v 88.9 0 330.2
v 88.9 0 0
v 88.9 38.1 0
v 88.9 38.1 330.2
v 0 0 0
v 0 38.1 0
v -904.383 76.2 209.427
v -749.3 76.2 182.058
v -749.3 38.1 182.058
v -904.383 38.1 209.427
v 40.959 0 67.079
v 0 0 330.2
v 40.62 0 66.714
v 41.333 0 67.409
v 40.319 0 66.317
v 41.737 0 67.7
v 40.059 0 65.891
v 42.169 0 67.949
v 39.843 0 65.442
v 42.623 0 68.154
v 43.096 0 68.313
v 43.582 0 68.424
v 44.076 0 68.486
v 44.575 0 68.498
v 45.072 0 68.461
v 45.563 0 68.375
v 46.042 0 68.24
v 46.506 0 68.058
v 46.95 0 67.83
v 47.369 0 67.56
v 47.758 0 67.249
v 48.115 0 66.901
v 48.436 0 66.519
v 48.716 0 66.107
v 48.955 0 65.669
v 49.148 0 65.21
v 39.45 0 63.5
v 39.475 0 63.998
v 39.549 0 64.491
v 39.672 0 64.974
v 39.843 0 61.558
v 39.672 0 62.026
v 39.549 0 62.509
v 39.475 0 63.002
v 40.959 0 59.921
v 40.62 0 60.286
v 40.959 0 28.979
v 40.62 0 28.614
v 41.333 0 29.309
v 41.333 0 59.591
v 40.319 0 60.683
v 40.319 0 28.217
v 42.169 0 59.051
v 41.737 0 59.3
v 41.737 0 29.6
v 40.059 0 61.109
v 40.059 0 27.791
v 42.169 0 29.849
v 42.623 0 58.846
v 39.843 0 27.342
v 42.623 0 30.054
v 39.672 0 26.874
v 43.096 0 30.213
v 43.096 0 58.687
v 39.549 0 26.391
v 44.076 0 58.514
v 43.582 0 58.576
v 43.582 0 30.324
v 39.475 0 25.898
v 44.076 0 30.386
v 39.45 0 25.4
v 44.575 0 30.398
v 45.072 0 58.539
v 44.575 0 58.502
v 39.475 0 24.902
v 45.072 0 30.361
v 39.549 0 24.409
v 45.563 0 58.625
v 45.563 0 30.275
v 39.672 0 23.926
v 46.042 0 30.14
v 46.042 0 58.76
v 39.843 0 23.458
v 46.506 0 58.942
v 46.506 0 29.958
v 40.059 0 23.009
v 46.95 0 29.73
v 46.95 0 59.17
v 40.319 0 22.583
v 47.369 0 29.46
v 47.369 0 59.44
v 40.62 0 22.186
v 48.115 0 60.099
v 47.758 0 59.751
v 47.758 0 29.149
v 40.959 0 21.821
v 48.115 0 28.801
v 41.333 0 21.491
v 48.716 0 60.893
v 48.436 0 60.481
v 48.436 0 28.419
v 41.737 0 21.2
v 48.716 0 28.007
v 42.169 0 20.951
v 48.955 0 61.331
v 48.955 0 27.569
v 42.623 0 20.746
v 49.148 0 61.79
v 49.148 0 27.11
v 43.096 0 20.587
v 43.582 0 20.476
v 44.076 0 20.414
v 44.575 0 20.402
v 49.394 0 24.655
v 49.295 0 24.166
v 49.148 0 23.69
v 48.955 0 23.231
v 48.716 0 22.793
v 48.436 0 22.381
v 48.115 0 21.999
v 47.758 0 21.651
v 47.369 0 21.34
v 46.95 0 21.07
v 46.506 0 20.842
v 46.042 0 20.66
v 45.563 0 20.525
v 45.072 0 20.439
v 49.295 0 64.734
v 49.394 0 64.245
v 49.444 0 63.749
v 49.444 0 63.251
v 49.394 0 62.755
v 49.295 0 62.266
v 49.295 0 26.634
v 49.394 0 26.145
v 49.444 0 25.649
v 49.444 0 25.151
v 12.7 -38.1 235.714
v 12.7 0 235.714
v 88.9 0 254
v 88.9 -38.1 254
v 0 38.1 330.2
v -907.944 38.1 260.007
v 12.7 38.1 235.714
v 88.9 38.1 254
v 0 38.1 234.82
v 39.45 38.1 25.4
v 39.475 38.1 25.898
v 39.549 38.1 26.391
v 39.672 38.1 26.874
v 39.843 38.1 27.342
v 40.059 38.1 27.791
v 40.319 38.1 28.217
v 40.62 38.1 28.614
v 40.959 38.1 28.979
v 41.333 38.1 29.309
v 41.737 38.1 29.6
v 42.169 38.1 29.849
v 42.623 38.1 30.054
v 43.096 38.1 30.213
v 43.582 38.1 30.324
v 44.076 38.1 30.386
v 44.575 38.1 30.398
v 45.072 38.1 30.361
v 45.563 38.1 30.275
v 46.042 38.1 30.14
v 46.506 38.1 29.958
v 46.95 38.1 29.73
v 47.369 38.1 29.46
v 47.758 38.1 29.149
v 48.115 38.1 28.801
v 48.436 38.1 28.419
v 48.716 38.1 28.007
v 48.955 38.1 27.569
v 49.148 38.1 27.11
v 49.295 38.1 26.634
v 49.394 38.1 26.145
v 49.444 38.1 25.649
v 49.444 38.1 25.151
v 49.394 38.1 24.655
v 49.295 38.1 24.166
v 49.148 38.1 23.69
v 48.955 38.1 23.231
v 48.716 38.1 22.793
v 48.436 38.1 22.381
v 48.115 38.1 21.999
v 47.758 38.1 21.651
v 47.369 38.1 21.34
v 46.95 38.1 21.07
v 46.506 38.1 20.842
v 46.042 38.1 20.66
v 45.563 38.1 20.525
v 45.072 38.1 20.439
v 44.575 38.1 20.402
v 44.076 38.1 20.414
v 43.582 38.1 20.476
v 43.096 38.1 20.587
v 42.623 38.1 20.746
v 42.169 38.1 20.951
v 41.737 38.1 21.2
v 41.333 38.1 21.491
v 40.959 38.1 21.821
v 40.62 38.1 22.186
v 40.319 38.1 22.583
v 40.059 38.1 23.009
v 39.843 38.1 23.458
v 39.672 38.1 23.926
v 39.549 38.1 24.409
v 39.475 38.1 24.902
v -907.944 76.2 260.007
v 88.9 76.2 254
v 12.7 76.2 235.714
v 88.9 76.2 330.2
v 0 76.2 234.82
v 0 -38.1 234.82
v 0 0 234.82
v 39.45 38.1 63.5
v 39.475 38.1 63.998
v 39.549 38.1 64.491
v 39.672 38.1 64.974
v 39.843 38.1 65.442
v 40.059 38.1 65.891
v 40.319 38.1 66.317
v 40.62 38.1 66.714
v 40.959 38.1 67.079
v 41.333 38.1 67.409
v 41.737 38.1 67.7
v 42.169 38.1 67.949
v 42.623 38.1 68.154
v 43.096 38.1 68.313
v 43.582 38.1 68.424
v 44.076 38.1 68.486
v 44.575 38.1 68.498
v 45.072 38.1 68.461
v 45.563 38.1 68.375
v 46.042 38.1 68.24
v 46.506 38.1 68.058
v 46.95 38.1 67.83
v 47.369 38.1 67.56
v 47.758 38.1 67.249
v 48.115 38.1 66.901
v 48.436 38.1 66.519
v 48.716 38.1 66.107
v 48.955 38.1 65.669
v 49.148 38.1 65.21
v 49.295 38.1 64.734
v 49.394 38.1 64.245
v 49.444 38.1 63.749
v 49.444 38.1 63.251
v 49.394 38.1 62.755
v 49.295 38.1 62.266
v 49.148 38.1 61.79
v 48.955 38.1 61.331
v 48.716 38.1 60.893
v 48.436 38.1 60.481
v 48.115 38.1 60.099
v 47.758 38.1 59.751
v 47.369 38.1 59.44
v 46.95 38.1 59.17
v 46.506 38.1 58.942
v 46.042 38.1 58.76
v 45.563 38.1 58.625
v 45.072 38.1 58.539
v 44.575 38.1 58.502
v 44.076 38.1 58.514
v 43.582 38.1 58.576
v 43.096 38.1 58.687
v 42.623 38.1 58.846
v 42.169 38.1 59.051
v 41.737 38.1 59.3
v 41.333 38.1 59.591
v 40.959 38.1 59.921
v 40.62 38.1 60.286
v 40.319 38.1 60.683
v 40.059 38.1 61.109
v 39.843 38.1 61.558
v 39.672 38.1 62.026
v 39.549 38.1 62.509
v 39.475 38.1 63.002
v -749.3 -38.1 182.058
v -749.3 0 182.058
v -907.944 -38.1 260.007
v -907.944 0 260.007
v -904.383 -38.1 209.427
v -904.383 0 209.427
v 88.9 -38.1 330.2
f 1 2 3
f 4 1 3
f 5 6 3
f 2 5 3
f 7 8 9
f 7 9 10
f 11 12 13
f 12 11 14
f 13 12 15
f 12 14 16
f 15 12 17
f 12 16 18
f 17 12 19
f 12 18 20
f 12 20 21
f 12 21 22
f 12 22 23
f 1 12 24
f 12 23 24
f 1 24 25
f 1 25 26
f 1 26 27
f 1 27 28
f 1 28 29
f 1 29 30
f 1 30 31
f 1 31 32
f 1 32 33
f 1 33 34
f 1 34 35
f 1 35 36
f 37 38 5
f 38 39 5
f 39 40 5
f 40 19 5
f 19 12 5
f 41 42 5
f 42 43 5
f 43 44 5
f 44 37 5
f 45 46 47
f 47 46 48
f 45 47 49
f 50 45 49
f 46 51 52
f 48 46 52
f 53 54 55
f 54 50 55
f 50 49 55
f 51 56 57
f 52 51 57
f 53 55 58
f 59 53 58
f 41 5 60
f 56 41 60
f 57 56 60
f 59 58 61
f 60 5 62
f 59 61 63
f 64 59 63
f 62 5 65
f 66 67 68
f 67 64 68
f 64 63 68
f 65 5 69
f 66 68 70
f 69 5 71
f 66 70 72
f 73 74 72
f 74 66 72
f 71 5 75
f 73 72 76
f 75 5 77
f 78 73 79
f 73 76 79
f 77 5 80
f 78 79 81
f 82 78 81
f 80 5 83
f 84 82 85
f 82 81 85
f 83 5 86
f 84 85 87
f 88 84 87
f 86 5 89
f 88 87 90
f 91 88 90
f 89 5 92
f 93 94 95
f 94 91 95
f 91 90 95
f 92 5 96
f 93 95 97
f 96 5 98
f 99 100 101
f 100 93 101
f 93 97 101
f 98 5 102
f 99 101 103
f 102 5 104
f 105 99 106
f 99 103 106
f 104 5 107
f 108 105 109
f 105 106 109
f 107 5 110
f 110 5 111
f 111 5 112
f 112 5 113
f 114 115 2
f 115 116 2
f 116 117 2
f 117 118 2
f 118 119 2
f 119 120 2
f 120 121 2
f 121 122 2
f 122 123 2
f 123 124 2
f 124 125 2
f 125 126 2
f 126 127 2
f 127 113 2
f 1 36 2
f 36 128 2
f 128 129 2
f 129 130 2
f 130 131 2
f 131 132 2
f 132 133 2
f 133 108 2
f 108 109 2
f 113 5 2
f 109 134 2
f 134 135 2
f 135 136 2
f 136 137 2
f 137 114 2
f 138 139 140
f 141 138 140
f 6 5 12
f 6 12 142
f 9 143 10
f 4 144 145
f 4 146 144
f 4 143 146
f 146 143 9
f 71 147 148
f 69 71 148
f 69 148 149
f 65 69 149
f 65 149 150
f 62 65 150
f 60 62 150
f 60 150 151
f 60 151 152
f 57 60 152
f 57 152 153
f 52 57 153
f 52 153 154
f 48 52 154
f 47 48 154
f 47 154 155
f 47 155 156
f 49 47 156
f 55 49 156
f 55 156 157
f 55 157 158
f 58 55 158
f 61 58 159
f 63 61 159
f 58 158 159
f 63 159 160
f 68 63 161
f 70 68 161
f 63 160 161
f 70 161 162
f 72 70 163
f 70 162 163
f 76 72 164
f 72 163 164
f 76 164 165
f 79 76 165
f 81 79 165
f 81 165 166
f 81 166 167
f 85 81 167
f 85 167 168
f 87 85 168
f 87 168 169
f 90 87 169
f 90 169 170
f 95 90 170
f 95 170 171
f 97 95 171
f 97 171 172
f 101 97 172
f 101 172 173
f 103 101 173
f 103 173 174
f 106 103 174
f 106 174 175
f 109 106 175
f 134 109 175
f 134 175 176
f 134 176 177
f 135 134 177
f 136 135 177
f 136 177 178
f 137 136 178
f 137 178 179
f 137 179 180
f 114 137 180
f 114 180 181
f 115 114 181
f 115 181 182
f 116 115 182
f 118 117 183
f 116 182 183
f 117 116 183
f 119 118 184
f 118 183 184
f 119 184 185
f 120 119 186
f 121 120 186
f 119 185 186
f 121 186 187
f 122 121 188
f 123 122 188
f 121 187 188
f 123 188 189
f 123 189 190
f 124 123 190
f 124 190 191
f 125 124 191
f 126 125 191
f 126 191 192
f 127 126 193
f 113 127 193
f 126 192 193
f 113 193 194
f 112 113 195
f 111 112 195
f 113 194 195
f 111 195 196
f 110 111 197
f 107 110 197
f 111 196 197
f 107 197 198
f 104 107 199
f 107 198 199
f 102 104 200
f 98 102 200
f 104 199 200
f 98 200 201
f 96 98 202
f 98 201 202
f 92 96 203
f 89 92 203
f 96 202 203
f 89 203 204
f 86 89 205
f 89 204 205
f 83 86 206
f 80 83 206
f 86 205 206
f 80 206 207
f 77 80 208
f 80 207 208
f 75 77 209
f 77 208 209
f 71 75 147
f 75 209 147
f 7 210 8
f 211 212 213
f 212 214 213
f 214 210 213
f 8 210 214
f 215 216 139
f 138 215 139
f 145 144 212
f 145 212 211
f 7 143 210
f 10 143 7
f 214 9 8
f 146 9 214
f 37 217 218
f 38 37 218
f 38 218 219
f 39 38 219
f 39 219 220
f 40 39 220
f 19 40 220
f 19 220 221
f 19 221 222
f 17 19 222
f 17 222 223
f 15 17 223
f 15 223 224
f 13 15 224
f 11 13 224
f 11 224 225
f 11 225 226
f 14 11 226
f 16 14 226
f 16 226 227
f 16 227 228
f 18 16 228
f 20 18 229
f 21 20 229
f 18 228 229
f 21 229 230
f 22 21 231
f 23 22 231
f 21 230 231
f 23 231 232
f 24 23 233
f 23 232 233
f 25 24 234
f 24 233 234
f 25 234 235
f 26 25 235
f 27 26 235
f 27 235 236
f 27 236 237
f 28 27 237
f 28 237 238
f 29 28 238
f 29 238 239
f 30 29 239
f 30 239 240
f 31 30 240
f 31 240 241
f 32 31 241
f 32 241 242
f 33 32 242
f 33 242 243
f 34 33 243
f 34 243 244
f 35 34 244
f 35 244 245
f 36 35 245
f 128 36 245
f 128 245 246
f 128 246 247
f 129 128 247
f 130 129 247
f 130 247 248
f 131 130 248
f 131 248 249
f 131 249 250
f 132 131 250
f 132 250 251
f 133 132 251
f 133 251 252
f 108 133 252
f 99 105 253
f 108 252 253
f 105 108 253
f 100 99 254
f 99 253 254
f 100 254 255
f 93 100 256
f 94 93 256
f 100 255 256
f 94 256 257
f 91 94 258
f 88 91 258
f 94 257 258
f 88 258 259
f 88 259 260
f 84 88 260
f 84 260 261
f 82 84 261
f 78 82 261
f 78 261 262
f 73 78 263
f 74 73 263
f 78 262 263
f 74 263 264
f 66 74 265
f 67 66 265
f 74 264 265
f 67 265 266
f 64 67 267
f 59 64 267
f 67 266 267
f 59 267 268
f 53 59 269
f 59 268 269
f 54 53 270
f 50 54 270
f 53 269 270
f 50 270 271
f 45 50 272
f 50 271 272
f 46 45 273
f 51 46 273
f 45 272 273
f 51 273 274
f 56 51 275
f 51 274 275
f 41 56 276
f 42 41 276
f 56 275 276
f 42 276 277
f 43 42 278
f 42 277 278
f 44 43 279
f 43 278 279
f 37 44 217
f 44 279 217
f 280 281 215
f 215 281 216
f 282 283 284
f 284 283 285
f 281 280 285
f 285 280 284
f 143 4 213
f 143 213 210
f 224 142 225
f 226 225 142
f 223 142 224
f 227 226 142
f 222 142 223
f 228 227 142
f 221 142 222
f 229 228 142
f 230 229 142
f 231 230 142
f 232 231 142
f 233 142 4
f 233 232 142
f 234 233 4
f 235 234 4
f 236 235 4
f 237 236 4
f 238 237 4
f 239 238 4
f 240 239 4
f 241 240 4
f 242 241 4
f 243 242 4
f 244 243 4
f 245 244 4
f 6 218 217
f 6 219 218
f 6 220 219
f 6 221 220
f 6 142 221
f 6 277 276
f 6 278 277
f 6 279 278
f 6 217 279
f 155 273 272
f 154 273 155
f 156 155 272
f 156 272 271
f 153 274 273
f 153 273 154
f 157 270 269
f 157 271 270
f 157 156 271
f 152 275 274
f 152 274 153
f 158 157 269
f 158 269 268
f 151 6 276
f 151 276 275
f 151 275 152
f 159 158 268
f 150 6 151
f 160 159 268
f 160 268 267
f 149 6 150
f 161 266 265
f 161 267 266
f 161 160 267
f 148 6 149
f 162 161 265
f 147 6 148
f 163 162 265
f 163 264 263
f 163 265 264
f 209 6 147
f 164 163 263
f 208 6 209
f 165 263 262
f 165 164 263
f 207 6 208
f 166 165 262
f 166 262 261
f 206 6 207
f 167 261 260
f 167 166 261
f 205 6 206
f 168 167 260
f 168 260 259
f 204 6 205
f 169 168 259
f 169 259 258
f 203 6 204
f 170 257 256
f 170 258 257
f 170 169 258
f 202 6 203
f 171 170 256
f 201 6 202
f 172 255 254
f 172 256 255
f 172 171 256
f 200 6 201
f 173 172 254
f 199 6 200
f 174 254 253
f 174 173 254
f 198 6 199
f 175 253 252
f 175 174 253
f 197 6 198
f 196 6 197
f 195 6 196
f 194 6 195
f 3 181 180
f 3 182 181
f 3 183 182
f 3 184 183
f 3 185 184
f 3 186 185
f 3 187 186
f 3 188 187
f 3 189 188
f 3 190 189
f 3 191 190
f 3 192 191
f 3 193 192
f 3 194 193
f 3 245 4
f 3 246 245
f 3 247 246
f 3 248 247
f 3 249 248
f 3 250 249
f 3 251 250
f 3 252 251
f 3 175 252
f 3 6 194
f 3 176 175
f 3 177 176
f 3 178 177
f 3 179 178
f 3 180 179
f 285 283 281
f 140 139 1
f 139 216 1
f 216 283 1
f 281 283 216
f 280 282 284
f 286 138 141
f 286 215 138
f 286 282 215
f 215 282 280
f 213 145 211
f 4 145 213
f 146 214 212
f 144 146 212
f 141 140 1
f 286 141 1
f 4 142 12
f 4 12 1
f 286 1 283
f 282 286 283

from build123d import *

# Parameters (mm, degrees)
F0_W     = 88.9
F0_H     = 38.1
F1_DEPTH = 330.2
F3_D     = 10
F5_DEPTH = 38.1
F8_DEPTH = 76.201


with BuildPart() as f1:
    # F0 (on Top) → F1 (new body)
    with BuildSketch(Plane.XY):
        with Locations((44.45, 19.05)):
            Rectangle(F0_W, F0_H)
    extrude(amount=F1_DEPTH)

    # F3 (through all)
    with Locations(Plane.XZ):
        with Locations((44.45, 63.5), (44.45, 25.4)):
            Hole(F3_D / 2)


with BuildPart() as f5:
    # F4 (on face) → F5 (new body)
    with BuildSketch(Plane.XZ):
        Polygon((88.9, 254), (88.9, 330.2), (0, 323.9401055744), (0, 234.8199828287), (12.7, 235.7142534609), align=None)
        Polygon((0, 234.8199828287), (0, 323.9401055744), (-907.9444327643, 260.0071888885), (-901.7, 171.3267679408), align=None)
    extrude(amount=F5_DEPTH)

    # F7 (on face) → F8 (cut, through all)
    with BuildSketch(Plane.XZ.offset(38.1)):
        Polygon((-904.3828118967, 209.4267679408), (-901.7, 171.3267679408), (-749.3, 182.0580155275), align=None)
    extrude(amount=-F8_DEPTH, mode=Mode.SUBTRACT)


with BuildPart() as f9_1:
    # F9: instance of F5
    add(f5.part.mirror(Plane(origin=(44.45, 19.05, 165.7490804907), x_dir=(1, 0, 0), z_dir=(0, -1, 0))))


solid = Compound([f1.part, f5.part, f9_1.part])
